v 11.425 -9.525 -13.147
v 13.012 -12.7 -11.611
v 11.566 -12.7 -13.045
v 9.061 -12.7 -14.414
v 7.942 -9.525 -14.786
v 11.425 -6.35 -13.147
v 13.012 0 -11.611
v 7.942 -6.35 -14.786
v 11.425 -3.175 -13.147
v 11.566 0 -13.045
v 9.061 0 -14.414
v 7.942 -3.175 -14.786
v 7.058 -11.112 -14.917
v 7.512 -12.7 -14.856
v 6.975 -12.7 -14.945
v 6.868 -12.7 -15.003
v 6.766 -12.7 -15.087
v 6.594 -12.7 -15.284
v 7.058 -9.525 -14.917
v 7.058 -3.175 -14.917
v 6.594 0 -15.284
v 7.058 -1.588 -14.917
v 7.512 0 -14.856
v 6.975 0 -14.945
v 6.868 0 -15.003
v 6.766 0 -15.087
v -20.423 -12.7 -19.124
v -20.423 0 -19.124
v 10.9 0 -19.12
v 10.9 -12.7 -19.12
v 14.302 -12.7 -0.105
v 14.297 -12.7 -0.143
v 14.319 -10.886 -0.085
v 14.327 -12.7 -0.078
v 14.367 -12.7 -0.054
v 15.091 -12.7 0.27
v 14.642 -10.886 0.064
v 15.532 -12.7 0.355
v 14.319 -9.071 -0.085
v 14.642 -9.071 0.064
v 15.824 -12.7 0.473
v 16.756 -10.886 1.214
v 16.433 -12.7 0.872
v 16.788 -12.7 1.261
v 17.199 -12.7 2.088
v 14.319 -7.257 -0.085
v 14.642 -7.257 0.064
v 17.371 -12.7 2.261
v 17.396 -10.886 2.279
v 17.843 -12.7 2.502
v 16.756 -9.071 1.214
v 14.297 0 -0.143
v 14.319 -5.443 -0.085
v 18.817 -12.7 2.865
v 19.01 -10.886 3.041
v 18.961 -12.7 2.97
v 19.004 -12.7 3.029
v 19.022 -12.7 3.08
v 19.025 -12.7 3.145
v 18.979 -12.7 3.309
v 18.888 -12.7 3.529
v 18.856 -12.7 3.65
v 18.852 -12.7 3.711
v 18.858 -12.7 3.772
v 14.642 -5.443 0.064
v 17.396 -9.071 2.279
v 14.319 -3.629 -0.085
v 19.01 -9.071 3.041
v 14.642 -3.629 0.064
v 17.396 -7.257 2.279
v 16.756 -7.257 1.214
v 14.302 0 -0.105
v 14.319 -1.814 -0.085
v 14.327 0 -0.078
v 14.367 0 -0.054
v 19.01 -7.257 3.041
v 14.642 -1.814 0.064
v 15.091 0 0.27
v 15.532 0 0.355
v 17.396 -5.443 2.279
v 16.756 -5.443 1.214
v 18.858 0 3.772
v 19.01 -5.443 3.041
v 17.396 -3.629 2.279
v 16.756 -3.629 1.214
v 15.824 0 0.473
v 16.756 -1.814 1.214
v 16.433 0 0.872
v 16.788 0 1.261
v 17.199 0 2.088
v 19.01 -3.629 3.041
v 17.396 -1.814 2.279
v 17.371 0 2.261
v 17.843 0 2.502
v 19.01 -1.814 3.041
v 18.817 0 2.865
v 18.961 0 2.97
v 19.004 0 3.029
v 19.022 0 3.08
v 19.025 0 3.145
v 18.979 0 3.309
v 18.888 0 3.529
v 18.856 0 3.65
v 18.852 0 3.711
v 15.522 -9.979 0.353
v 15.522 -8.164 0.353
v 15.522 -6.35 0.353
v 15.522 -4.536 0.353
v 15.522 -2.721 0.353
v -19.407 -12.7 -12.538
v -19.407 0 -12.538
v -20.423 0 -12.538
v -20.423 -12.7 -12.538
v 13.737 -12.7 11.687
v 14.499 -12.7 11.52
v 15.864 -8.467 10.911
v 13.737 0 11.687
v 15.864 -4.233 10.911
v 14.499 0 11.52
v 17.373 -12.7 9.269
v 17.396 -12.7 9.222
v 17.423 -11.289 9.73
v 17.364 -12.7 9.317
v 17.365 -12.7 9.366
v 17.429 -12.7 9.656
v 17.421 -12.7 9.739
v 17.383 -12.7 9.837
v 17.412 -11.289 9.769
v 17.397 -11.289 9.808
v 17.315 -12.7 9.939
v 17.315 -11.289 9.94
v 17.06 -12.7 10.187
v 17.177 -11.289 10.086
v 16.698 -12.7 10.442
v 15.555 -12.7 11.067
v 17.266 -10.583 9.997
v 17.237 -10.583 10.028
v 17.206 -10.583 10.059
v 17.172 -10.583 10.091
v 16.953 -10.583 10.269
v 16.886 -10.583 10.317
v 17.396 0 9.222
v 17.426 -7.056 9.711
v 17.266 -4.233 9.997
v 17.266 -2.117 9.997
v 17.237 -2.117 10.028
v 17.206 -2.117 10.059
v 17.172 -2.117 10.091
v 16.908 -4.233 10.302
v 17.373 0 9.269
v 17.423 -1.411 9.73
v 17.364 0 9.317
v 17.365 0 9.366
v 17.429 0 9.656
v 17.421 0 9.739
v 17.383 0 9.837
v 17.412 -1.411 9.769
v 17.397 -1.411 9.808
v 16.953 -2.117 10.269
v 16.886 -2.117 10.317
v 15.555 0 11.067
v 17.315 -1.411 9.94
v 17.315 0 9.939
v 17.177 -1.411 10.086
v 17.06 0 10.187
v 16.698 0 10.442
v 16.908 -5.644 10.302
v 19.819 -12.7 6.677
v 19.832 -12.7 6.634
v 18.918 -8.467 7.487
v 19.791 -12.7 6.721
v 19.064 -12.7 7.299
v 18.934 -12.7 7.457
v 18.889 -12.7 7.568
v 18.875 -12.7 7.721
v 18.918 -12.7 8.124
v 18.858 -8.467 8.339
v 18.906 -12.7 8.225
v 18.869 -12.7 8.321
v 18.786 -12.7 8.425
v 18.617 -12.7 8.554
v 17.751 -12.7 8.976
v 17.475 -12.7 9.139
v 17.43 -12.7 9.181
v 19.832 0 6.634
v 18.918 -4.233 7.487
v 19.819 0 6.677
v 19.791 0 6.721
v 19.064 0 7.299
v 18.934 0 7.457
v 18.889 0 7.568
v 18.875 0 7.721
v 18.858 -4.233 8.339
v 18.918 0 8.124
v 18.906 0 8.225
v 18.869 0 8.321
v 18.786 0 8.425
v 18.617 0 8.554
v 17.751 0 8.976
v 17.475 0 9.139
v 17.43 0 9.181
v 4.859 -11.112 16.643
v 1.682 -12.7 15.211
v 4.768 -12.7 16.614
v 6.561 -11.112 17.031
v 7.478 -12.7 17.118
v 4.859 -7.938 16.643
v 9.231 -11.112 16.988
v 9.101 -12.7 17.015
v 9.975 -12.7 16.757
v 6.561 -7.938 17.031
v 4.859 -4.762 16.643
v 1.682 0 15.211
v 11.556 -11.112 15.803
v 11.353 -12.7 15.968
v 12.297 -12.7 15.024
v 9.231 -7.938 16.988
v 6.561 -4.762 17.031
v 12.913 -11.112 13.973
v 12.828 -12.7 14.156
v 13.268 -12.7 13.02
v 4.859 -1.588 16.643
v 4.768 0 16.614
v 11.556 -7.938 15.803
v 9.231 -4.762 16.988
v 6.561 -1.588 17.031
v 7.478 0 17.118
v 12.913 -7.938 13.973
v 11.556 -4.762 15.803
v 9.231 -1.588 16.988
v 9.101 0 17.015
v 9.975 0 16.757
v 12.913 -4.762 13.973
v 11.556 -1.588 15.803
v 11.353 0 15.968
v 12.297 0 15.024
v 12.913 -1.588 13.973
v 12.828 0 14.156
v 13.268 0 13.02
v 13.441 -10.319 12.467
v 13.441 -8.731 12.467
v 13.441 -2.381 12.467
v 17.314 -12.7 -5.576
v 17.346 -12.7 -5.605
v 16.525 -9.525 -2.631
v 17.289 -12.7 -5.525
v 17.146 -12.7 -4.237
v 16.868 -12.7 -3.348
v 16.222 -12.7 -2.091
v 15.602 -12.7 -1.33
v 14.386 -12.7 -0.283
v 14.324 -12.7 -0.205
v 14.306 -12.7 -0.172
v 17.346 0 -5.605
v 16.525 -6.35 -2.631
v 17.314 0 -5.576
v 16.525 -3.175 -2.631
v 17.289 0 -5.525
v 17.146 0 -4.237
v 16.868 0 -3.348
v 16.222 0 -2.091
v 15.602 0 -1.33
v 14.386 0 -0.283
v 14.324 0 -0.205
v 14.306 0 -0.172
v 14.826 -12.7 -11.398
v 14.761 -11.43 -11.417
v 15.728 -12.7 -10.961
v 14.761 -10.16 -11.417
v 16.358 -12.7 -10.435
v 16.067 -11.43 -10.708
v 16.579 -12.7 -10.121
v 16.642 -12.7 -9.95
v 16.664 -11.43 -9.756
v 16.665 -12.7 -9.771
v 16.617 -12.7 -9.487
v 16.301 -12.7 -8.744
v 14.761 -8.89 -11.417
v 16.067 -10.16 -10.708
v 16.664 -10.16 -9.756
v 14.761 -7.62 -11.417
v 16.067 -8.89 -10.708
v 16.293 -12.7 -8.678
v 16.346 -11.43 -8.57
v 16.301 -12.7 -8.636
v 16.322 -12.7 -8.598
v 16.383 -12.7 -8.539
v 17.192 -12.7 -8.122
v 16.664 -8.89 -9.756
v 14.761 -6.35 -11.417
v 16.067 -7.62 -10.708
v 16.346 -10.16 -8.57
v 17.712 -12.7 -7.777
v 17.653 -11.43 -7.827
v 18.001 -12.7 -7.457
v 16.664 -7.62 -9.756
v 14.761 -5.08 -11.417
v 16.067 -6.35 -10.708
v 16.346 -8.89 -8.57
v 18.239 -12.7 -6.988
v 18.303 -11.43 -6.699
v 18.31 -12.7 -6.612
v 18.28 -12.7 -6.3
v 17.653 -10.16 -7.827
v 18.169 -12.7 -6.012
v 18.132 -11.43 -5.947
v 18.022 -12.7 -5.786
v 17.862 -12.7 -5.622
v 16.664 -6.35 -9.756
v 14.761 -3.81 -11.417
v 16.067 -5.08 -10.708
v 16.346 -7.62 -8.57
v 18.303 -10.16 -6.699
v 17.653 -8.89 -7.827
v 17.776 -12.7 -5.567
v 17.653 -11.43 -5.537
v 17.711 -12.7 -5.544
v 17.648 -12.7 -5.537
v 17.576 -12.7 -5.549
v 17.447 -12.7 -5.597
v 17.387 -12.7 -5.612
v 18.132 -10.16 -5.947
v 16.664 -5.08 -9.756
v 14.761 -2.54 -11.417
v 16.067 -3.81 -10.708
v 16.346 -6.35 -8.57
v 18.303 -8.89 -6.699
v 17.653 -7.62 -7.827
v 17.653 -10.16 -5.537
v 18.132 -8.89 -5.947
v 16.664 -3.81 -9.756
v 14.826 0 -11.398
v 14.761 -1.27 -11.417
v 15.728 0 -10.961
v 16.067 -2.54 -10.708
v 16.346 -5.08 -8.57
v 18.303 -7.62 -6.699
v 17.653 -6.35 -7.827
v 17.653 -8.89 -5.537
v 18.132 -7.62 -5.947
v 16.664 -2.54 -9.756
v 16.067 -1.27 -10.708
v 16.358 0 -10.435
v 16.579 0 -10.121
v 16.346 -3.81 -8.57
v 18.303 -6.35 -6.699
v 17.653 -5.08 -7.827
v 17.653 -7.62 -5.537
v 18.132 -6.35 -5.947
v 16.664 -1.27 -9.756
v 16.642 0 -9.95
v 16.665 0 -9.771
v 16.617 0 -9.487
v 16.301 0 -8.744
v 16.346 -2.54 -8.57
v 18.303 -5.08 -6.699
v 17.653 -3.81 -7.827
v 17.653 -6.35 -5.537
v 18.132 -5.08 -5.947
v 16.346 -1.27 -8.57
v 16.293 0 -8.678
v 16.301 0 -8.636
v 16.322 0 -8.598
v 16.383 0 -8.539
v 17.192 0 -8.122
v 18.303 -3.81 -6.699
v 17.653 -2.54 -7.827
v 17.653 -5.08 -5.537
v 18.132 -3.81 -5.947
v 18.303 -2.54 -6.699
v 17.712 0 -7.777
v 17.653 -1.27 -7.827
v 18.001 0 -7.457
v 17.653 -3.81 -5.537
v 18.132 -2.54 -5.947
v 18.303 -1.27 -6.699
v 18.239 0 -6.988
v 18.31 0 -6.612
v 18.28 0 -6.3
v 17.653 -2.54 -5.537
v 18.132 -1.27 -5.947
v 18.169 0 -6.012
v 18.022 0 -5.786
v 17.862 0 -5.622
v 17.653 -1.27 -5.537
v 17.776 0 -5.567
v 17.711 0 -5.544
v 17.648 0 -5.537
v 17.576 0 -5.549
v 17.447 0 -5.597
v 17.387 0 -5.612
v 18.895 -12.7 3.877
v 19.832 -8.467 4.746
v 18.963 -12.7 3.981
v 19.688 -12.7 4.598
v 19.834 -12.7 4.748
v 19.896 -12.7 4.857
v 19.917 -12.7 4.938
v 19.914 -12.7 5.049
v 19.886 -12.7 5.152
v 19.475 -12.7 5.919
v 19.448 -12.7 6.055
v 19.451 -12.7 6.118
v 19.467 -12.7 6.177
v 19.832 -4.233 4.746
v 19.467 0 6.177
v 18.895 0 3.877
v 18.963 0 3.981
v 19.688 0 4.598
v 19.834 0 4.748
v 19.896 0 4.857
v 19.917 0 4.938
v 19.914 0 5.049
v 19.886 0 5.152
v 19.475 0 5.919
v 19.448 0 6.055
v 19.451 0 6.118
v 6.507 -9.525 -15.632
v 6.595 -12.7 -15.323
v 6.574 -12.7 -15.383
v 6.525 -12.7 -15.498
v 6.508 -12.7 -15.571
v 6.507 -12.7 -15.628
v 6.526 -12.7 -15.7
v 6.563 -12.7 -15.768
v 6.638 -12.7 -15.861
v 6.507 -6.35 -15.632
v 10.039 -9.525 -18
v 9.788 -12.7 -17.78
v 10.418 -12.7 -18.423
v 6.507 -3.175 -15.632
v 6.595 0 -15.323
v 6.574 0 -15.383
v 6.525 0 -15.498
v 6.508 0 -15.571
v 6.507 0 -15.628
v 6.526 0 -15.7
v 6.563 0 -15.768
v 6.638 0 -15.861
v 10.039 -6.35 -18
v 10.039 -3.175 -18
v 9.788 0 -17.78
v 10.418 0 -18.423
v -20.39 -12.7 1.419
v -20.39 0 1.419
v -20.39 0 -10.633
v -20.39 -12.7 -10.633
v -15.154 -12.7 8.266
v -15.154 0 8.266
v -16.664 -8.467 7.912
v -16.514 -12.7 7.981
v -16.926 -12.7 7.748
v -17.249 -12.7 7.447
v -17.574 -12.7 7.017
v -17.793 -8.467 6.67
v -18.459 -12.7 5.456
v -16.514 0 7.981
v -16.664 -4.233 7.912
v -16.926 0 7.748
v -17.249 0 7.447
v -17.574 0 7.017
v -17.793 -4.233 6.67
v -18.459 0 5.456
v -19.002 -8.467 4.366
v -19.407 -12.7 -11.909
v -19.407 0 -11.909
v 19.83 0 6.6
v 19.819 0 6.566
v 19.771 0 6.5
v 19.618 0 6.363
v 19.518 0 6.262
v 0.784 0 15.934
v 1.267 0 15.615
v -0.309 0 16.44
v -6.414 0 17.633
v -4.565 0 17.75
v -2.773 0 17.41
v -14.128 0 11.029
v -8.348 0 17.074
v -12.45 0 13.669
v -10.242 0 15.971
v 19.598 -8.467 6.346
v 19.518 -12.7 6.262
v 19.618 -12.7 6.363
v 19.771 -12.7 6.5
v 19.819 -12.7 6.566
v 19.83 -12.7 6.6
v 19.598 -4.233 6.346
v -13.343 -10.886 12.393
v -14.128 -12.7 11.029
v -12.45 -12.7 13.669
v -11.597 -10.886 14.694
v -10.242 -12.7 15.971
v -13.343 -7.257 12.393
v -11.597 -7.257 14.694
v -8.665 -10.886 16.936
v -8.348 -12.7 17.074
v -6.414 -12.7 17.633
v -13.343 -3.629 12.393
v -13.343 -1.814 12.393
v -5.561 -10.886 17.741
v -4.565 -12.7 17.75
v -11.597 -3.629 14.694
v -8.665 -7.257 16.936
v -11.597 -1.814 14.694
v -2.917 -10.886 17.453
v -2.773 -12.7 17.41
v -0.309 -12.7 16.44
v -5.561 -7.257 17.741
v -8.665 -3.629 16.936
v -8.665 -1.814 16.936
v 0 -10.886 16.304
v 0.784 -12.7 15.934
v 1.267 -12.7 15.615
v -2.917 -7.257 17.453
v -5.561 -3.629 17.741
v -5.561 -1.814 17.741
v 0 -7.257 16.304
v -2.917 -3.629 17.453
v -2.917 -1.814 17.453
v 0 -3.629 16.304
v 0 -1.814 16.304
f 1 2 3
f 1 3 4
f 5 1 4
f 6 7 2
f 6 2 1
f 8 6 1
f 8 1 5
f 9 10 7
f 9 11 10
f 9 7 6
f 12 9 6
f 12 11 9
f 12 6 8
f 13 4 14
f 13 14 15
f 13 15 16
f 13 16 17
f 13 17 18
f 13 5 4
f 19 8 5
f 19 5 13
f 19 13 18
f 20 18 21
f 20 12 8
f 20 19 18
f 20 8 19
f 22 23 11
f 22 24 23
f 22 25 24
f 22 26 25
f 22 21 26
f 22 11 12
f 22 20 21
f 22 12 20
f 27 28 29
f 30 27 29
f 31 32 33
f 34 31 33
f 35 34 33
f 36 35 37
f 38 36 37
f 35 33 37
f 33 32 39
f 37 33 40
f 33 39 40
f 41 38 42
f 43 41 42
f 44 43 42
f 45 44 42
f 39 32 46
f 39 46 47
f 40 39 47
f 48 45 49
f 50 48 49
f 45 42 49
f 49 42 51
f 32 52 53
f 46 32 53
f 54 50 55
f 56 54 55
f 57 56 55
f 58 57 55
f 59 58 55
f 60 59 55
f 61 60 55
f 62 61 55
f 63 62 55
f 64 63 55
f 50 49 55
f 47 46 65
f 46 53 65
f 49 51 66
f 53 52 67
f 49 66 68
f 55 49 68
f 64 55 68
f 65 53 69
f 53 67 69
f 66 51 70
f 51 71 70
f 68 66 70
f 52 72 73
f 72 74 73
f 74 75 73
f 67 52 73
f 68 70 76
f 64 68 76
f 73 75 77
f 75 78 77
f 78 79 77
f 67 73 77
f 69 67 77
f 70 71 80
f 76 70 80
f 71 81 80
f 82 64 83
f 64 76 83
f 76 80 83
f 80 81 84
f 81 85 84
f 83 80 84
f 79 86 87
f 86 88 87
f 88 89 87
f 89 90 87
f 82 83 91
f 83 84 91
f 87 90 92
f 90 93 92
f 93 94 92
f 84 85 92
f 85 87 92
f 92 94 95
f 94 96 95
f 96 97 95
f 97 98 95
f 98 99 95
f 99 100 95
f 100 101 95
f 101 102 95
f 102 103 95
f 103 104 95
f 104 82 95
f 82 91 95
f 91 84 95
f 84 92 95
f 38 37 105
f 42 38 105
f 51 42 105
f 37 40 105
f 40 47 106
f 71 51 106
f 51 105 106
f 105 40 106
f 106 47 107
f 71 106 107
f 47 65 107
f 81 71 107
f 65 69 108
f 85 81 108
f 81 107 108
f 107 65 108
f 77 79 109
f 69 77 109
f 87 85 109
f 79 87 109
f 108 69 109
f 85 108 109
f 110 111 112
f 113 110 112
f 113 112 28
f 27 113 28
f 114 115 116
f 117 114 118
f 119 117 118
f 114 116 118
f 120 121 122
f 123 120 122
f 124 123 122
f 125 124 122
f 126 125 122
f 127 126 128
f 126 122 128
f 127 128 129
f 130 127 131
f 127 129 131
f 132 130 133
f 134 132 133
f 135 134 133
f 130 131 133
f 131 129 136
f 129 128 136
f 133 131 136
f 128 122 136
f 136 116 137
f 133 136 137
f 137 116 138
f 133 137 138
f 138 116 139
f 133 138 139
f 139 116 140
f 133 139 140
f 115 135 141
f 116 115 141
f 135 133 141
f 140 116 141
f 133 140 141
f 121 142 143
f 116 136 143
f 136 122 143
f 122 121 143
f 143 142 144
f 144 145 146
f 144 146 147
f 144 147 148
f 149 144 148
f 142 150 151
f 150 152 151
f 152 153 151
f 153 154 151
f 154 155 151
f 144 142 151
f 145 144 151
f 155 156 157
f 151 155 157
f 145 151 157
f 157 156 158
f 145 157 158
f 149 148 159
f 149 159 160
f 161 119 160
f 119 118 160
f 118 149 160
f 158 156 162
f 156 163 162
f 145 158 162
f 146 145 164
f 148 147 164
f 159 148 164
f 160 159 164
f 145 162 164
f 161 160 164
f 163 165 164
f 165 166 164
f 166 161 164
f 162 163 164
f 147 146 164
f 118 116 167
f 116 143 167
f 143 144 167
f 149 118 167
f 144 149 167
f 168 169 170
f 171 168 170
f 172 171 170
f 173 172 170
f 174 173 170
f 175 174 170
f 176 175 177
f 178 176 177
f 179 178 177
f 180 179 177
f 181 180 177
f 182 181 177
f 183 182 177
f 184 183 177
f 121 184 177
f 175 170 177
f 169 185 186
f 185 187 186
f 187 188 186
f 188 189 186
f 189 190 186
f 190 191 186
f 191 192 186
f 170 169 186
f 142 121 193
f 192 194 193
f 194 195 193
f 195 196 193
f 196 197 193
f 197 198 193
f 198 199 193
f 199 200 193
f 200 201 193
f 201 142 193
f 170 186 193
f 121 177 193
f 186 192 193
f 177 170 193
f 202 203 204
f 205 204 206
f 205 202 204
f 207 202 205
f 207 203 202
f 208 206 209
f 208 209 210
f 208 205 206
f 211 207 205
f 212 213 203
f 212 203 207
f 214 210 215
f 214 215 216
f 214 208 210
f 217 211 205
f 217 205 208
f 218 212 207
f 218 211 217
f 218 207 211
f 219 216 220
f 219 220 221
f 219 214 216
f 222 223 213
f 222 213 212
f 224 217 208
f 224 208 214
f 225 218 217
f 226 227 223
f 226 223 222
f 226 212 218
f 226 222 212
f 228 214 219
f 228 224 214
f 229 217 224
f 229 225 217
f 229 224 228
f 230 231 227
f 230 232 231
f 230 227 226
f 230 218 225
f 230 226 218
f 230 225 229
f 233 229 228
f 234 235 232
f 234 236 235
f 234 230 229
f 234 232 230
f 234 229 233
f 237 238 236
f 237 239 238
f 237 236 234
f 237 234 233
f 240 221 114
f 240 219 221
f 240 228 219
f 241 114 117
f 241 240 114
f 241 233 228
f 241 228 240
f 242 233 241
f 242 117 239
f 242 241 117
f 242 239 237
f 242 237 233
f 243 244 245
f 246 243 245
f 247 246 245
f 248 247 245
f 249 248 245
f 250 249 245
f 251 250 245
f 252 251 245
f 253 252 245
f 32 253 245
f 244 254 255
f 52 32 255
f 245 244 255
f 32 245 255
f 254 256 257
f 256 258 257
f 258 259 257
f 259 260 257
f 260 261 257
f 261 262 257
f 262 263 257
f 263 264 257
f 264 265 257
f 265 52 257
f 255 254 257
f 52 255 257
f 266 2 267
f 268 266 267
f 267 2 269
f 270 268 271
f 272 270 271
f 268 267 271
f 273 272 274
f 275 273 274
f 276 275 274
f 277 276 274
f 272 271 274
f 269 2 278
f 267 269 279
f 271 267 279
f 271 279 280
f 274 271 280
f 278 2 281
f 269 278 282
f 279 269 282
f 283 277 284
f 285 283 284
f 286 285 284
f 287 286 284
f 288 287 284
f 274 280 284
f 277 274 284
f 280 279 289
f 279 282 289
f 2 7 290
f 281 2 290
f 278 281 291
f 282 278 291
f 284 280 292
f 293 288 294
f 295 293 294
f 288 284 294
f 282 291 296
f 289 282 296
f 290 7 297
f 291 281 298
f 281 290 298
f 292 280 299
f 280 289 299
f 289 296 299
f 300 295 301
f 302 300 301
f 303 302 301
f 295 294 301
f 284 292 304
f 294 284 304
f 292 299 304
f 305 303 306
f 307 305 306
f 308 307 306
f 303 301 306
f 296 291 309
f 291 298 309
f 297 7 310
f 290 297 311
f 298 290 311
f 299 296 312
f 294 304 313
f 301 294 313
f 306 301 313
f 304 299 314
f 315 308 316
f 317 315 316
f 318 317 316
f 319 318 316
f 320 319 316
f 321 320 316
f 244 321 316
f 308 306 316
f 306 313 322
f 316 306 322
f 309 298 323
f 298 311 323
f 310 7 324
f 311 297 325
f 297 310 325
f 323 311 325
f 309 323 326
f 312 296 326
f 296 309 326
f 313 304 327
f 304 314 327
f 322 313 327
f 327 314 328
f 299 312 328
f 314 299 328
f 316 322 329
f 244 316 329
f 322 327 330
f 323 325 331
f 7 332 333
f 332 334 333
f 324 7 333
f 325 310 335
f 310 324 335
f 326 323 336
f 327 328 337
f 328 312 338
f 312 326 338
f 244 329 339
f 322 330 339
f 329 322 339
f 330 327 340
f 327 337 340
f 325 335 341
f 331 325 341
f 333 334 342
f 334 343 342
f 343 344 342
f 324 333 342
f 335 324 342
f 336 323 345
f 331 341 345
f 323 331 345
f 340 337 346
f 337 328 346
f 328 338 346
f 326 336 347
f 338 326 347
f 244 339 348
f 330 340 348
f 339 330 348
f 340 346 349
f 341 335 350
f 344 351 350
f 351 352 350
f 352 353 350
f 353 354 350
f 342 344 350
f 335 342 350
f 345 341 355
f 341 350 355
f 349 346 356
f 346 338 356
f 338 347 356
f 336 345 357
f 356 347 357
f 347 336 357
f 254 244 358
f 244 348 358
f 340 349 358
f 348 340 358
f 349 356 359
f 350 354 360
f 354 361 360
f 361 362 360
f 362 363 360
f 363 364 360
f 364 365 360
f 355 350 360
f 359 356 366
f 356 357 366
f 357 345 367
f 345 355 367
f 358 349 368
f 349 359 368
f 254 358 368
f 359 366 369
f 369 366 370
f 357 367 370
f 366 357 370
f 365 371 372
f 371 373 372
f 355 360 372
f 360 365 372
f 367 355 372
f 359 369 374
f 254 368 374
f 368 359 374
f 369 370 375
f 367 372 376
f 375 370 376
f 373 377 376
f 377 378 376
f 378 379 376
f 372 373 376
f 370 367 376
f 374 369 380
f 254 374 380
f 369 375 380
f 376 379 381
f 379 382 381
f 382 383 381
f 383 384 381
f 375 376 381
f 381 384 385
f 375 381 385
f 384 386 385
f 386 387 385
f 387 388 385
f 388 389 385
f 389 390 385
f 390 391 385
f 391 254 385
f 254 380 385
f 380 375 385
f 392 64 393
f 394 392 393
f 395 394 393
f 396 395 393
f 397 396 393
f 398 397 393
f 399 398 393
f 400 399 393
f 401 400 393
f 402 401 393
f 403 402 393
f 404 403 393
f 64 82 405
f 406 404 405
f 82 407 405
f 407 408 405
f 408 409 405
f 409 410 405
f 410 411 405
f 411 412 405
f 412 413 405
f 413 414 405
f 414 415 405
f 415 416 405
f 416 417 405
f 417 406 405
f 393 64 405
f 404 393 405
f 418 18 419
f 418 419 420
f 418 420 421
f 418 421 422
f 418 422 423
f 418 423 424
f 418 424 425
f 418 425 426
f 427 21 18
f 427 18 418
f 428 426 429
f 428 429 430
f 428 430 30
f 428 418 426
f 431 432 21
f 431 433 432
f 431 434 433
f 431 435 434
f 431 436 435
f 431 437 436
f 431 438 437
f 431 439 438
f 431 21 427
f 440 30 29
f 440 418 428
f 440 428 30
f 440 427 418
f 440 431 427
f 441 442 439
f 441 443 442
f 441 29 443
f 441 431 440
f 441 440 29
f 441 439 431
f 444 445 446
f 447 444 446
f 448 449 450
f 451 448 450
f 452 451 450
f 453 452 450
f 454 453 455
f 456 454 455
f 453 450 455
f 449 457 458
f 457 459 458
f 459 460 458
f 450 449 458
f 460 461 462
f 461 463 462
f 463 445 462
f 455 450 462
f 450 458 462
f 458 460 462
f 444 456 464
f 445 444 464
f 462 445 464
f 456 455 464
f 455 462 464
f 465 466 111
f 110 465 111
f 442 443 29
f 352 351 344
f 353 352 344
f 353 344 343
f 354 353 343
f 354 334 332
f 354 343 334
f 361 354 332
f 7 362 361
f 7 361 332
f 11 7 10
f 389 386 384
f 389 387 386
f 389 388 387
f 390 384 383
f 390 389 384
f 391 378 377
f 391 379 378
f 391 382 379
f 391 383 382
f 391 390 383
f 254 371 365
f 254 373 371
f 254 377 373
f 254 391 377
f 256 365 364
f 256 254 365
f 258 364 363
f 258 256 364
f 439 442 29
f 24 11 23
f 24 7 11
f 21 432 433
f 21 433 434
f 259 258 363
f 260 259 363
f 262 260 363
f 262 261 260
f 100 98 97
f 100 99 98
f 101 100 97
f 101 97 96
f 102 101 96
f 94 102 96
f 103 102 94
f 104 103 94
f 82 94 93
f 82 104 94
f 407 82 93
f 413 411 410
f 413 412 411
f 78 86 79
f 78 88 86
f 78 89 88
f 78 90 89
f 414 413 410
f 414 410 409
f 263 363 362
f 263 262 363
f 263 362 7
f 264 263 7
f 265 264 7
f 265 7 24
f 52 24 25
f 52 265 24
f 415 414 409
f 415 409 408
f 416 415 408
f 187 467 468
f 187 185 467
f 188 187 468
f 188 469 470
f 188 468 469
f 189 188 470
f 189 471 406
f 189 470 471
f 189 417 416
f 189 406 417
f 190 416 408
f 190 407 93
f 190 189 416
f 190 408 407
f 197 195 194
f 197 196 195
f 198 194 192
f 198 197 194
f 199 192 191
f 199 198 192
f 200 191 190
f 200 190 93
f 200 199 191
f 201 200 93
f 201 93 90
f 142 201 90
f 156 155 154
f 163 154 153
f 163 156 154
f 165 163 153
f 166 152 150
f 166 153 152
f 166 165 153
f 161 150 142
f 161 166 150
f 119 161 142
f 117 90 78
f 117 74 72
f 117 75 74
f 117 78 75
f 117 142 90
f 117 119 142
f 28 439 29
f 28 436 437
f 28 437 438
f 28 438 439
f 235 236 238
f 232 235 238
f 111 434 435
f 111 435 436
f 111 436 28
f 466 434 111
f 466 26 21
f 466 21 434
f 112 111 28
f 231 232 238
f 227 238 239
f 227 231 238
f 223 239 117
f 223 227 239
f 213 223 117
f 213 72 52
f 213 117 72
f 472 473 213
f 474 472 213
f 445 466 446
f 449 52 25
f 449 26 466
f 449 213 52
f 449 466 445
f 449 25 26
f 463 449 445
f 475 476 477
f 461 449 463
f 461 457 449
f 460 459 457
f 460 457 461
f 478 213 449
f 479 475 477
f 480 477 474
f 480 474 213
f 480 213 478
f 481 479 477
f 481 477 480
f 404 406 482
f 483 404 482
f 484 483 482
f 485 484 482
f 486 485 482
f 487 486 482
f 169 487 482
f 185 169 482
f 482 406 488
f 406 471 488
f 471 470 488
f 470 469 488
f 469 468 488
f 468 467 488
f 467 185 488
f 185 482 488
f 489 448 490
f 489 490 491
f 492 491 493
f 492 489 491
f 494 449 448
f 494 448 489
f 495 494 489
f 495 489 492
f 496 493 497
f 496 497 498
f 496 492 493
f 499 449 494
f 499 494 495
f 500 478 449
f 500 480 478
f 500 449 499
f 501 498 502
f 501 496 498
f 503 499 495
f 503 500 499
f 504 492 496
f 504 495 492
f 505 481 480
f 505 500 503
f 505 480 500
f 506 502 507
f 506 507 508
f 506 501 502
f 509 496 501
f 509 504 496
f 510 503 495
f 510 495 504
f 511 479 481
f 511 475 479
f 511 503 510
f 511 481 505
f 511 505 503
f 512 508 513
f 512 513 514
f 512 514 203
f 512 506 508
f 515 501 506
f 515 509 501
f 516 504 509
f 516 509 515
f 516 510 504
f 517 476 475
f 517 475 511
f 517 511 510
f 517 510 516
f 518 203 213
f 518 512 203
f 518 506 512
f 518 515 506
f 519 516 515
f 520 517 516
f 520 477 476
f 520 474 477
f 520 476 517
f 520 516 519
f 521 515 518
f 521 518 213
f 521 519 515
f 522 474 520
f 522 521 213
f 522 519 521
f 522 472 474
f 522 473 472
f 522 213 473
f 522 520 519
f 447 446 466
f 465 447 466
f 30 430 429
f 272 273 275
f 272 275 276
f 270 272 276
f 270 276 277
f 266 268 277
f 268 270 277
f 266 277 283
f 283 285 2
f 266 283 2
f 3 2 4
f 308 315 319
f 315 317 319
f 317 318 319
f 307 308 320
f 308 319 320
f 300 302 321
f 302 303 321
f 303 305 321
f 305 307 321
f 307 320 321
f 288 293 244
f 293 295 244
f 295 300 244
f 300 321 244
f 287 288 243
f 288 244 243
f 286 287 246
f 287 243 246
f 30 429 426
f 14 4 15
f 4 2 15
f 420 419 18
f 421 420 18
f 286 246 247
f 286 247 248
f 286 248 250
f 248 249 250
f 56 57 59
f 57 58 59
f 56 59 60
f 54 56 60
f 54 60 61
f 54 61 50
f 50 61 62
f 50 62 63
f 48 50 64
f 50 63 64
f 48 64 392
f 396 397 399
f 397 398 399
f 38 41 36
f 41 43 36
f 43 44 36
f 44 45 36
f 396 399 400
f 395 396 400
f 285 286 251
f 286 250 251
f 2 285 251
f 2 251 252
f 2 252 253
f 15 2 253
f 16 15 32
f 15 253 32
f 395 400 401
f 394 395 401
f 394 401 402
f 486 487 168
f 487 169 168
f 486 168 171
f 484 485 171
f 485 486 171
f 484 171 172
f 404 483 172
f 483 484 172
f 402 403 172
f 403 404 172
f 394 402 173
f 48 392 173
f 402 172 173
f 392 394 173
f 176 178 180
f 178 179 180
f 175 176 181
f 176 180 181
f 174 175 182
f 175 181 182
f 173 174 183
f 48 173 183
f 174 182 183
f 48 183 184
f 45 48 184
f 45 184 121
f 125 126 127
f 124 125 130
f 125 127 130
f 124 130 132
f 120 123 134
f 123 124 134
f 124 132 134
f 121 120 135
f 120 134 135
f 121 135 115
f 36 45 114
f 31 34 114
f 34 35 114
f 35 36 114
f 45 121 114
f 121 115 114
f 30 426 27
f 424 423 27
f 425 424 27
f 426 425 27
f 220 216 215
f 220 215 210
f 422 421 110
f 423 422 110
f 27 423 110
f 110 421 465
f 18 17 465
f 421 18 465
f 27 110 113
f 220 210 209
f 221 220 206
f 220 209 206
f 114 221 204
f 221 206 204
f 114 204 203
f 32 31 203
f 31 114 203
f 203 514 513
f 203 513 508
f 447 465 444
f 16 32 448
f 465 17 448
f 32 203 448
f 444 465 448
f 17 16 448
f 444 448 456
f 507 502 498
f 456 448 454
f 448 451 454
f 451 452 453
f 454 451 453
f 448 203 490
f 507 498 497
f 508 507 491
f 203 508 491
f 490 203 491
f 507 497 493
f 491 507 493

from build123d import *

# Parameters (mm, degrees)
F1_DEPTH = 12.7


with BuildPart() as f1:
    # F0 (on Front) → F1 (new body)
    with BuildSketch(Plane.XZ):
        with BuildLine():
            add(Edge.make_bspline(
                [(-15.154437306, 8.266335297), (-15.0386769934, 8.7557337939), (-14.3741383819, 10.9978091678), (-11.8075027584, 14.8539144241), (-8.8682439542, 17.1025149238), (-5.5510699204, 17.9113797341), (-2.9329017816, 17.6184345826), (0.029448146, 16.2812136827), (1.1874474387, 15.7882755265), (1.681912574, 15.2114974335)],
                knots=[0.0948368965, 0.0948368965, 0.0948368965, 0.0948368965, 0.1381276669, 0.2913133216, 0.4131166921, 0.5266549515, 0.6300587596, 0.7423234113, 0.8321097944, 0.8321097944, 0.8321097944, 0.8321097944], degree=3))
            add(Edge.make_bspline(
                [(-15.154437306, 8.266335297), (-15.6970933244, 8.1973941045), (-16.8058294964, 8.0574230249), (-17.9939130366, 6.5810091616), (-19.4450451522, 3.4551507862), (-20.3898958862, 1.4194942778)],
                knots=[0, 0, 0, 0, 0.250970157, 0.5121328909, 1, 1, 1, 1], degree=3))
            Line((-20.3898958862, 1.4194942778), (-20.3898958862, -10.6331566349))
            Line((-20.3898958862, -10.6331566349), (-19.4074194878, -11.9092175737))
            add(Edge.make_bspline(
                [(-19.4074194878, -11.9092175737), (-18.5180737994, -12.4183908814), (-16.581459682, -13.5271523324), (-12.3451670543, -14.8422736814), (-5.009688178, -15.6796818442), (1.7860413854, -15.8777963562), (4.5406408215, -15.4618435648), (5.7173287496, -15.2841601521)],
                knots=[0, 0, 0, 0, 0.1583864727, 0.3448979212, 0.590608127, 0.8251192284, 1, 1, 1, 1], degree=3))
            add(Edge.make_bspline(
                [(5.7173287496, -15.2841601521), (5.8609689506, -15.2658925201), (6.0046091517, -15.2476248882), (6.1329162172, -15.2358156923)],
                knots=[0, 0, 0, 0, 0.0569882776, 0.0569882776, 0.0569882776, 0.0569882776], degree=3))
            add(Edge.make_bspline(
                [(6.1329162172, -15.2358156923), (6.3783655594, -15.2132248913), (6.5677031823, -15.2142687829), (6.593588274, -15.2841601521)],
                knots=[0.0569882776, 0.0569882776, 0.0569882776, 0.0569882776, 0.1660059315, 0.1660059315, 0.1660059315, 0.1660059315], degree=3))
            add(Edge.make_bspline(
                [(13.0124511197, -11.6107994691), (12.5939476472, -12.1151119974), (11.6230665427, -13.2850604846), (8.0648895517, -14.9571747505), (6.9580454759, -14.8325148516), (6.6999238056, -15.1523862623), (6.593588274, -15.2841601521)],
                knots=[0, 0, 0, 0, 0.288665761, 0.6696721803, 0.863918499, 1, 1, 1, 1], degree=3))
            add(Edge.make_bspline(
                [(17.3456892371, -5.6049809791), (16.7894235563, -5.8159730563), (15.5297664705, -6.2937621314), (12.6939593803, -7.3387226453), (9.5153698979, -7.5177566902), (6.8313239775, -7.3878665753), (-0.0764413013, -6.4191861087), (-4.2569807618, -5.4711619397), (-7.1031631337, -5.5883503751), (-8.6113560055, -5.7114062767), (-9.6992037188, -7.0974632625), (-10.1008982052, -8.2753221902), (-9.7951087777, -9.1999689012), (-8.8178808563, -10.0607275543), (-5.1552975142, -9.5027954786), (0.0958312582, -10.9234706923), (4.9916901863, -11.4326531973), (10.1309060151, -11.5467984944), (13.0124511197, -11.6107994691)],
                knots=[0, 0, 0, 0, 0.049671967, 0.1124815846, 0.1755999807, 0.2355156609, 0.3303542289, 0.407198297, 0.4661951976, 0.5089927858, 0.5551744044, 0.5948848593, 0.6285124105, 0.6657059392, 0.7329100796, 0.8172164163, 0.8975137145, 1, 1, 1, 1], degree=3))
            add(Edge.make_bspline(
                [(17.3456892371, -5.6049809791), (17.2093743725, -5.5377179746), (17.3063700602, -4.2081202189), (16.5247246741, -2.5910716918), (15.8122696589, -1.333796201), (14.3265511753, -0.3285375648), (14.2966350541, -0.1434823062)],
                knots=[0.2794739754, 0.2794739754, 0.2794739754, 0.2794739754, 0.3111508711, 0.3507898736, 0.3877031749, 0.4254693863, 0.4254693863, 0.4254693863, 0.4254693863], degree=3))
            add(Edge.make_bspline(
                [(14.2966350541, -0.1434823062), (14.28528809, -0.0732922116), (14.5390943831, -0.0082832717), (15.2057805922, 0.3674052609), (15.5504917984, 0.2720297382), (17.0298739485, 1.1324602338), (17.0023826914, 2.5038946686), (19.5386052141, 2.8164835894), (18.8087282257, 3.5114027514), (18.8575629145, 3.771558404)],
                knots=[0.4254693863, 0.4254693863, 0.4254693863, 0.4254693863, 0.4397938316, 0.4647992014, 0.4821806427, 0.5172443036, 0.5493696586, 0.5878624432, 0.6127594912, 0.6127594912, 0.6127594912, 0.6127594912], degree=3))
            add(Edge.make_bspline(
                [(6.526443176, 3.4349041525), (6.7192580038, 3.2869289286), (7.4139094803, 2.8639984225), (10.6532981542, 2.6478504245), (12.6043444481, 2.5154552823), (16.2310966256, 3.0020580182), (18.0173440963, 3.5253916409), (18.8575629145, 3.771558404)],
                knots=[0.0806534582, 0.0806534582, 0.0806534582, 0.0806534582, 0.196695384, 0.4063898377, 0.5802846438, 0.8025734137, 1, 1, 1, 1], degree=3))
            add(Edge.make_bspline(
                [(6.1772041954, 3.7408485077), (6.2848169441, 3.6393004747), (6.3924296928, 3.5377524418), (6.526443176, 3.4349041525)],
                knots=[0, 0, 0, 0, 0.0806534582, 0.0806534582, 0.0806534582, 0.0806534582], degree=3))
            add(Edge.make_bspline(
                [(5.7160095312, 7.9729855061), (5.0976693943, 8.2343174608), (3.7832262547, 8.7898466502), (1.1324645762, 9.0915716453), (-1.2590290764, 9.1863055842), (-3.8046943656, 8.0101043248), (-5.4662193187, 6.9958814732), (-7.3273259826, 6.1196327492), (-9.8163628138, 6.4981602022), (-10.1164278599, 5.5847431918), (-9.7430054798, 4.8978145547), (-8.7088858545, 5.1226858385), (-7.5608226582, 5.0596859794), (-6.4051488336, 3.9290459905), (-3.9867909343, 2.9861774035), (-2.2442746112, 2.135312525), (1.5307170459, 2.1064600064), (5.2711146458, 2.843862781), (6.1772041954, 3.7408485077)],
                knots=[0, 0, 0, 0, 0.0417728545, 0.0887990909, 0.133853577, 0.1816191509, 0.2221508879, 0.264090264, 0.3076439294, 0.3313226722, 0.3539557012, 0.3822014935, 0.4125147818, 0.448777936, 0.4950531519, 0.5350637901, 0.5917596244, 0.6555244473, 0.6555244473, 0.6555244473, 0.6555244473], degree=3))
            add(Edge.make_bspline(
                [(5.7160095312, 7.9729855061), (5.8226634167, 8.133455294), (5.9293173023, 8.293925082), (5.9873005375, 8.4341801703)],
                knots=[0, 0, 0, 0, 0.2132206179, 0.2132206179, 0.2132206179, 0.2132206179], degree=3))
            add(Edge.make_bspline(
                [(5.9873005375, 8.4341801703), (6.0362142973, 8.552497192), (6.0703656619, 8.8010891941), (5.5060942003, 9.3564826015), (5.0586828442, 9.7407121368)],
                knots=[0.2132206179, 0.2132206179, 0.2132206179, 0.2132206179, 0.393090231, 0.6434475586, 0.6434475586, 0.6434475586, 0.6434475586], degree=3))
            add(Edge.make_bspline(
                [(5.0586828442, 9.7407121368), (4.4214911434, 10.2879219198), (3.5428317334, 10.9589281712), (2.6641723234, 11.6299344227)],
                knots=[0.6434475586, 0.6434475586, 0.6434475586, 0.6434475586, 1, 1, 1, 1], degree=3))
            add(Edge.make_bspline(
                [(3.0040566344, 11.7049422115), (2.8865220696, 11.6584858594), (2.7689875048, 11.6120295074), (2.6641723234, 11.6299344227)],
                knots=[0, 0, 0, 0, 0.0600694759, 0.0600694759, 0.0600694759, 0.0600694759], degree=3))
            add(Edge.make_bspline(
                [(1.681912574, 15.2114974335), (2.2822756765, 14.5111926787), (3.1611878768, 12.6205136788), (3.0448523628, 11.9426505396), (3.0040566344, 11.7049422115)],
                knots=[0.8321097944, 0.8321097944, 0.8321097944, 0.8321097944, 0.9411254312, 1, 1, 1, 1], degree=3))
        make_face()
        with BuildLine():
            add(Edge.make_bspline(
                [(1.681912574, 15.2114974335), (2.2534059294, 15.5107841583), (3.3494857467, 16.0847928245), (4.8689656121, 16.6840744149), (6.5738284086, 17.1032992013), (9.2981220799, 17.2376703937), (11.6788150449, 15.9272363839), (12.9986733768, 14.15684852), (13.5304758298, 12.0692875636), (13.6890999092, 11.7758661013), (13.7369148433, 11.6874184459)],
                knots=[0, 0, 0, 0, 0.1277859741, 0.2450835618, 0.3677440513, 0.5194962645, 0.6695145135, 0.8096804032, 0.9426309106, 1, 1, 1, 1], degree=3))
            add(Edge.make_bspline(
                [(1.681912574, 15.2114974335), (2.2822756765, 14.5111926787), (3.1611878768, 12.6205136788), (3.0448523628, 11.9426505396), (3.0040566344, 11.7049422115)],
                knots=[0.8321097944, 0.8321097944, 0.8321097944, 0.8321097944, 0.9411254312, 1, 1, 1, 1], degree=3))
            add(Edge.make_bspline(
                [(3.0040566344, 11.7049422115), (3.825450629, 11.7796086695), (5.4822789239, 11.9302178792), (8.0414223037, 12.2516280122), (10.0610547761, 11.9381978313), (11.121368967, 11.7736458778)],
                knots=[0, 0, 0, 0, 0.3183430957, 0.6421277144, 1, 1, 1, 1], degree=3))
            add(Edge.make_bspline(
                [(13.7369148433, 11.6874184459), (13.4439442962, 11.6957851322), (13.0176107364, 11.48941269), (12.1511241129, 12.0723044073), (11.4728343183, 11.875580911), (11.121368967, 11.7736458778)],
                knots=[0.918596296, 0.918596296, 0.918596296, 0.918596296, 0.9431612313, 0.9705481964, 1, 1, 1, 1], degree=3))
        make_face()
        with BuildLine():
            add(Edge.make_bspline(
                [(3.0040566344, 11.7049422115), (3.825450629, 11.7796086695), (5.4822789239, 11.9302178792), (8.0414223037, 12.2516280122), (10.0610547761, 11.9381978313), (11.121368967, 11.7736458778)],
                knots=[0, 0, 0, 0, 0.3183430957, 0.6421277144, 1, 1, 1, 1], degree=3))
            add(Edge.make_bspline(
                [(3.0040566344, 11.7049422115), (2.8865220696, 11.6584858594), (2.7689875048, 11.6120295074), (2.6641723234, 11.6299344227)],
                knots=[0, 0, 0, 0, 0.0600694759, 0.0600694759, 0.0600694759, 0.0600694759], degree=3))
            add(Edge.make_bspline(
                [(5.0586828442, 9.7407121368), (4.4214911434, 10.2879219198), (3.5428317334, 10.9589281712), (2.6641723234, 11.6299344227)],
                knots=[0.6434475586, 0.6434475586, 0.6434475586, 0.6434475586, 1, 1, 1, 1], degree=3))
            add(Edge.make_bspline(
                [(5.9873005375, 8.4341801703), (6.0362142973, 8.552497192), (6.0703656619, 8.8010891941), (5.5060942003, 9.3564826015), (5.0586828442, 9.7407121368)],
                knots=[0.2132206179, 0.2132206179, 0.2132206179, 0.2132206179, 0.393090231, 0.6434475586, 0.6434475586, 0.6434475586, 0.6434475586], degree=3))
            add(Edge.make_bspline(
                [(5.9873005375, 8.4341801703), (7.2870663159, 8.8664574837), (9.8142199234, 9.7069405846), (13.4522244996, 9.9528294243), (16.0577204257, 9.4702199414), (17.3958968371, 9.2223528773)],
                knots=[0, 0, 0, 0, 0.3399710799, 0.6610107416, 1, 1, 1, 1], degree=3))
            add(Edge.make_bspline(
                [(17.3958968371, 9.2223528773), (17.2994233335, 9.3709031736), (17.755061546, 9.8475006389), (15.8039725214, 11.0060517119), (14.2540213824, 11.6726508584), (13.7369148433, 11.6874184459)],
                knots=[0.8146477527, 0.8146477527, 0.8146477527, 0.8146477527, 0.8347809324, 0.8752380512, 0.918596296, 0.918596296, 0.918596296, 0.918596296], degree=3))
            add(Edge.make_bspline(
                [(13.7369148433, 11.6874184459), (13.4439442962, 11.6957851322), (13.0176107364, 11.48941269), (12.1511241129, 12.0723044073), (11.4728343183, 11.875580911), (11.121368967, 11.7736458778)],
                knots=[0.918596296, 0.918596296, 0.918596296, 0.918596296, 0.9431612313, 0.9705481964, 1, 1, 1, 1], degree=3))
        make_face()
        with BuildLine():
            add(Edge.make_bspline(
                [(19.832007587, 6.633986719), (19.8064132047, 6.8547435664), (18.4881390523, 7.3872021621), (19.3650330523, 8.5287284815), (17.5763357516, 8.944512297), (17.3958968371, 9.2223528773)],
                knots=[0.7181383109, 0.7181383109, 0.7181383109, 0.7181383109, 0.7503501039, 0.7769917232, 0.8146477527, 0.8146477527, 0.8146477527, 0.8146477527], degree=3))
            add(Edge.make_bspline(
                [(5.9873005375, 8.4341801703), (7.2870663159, 8.8664574837), (9.8142199234, 9.7069405846), (13.4522244996, 9.9528294243), (16.0577204257, 9.4702199414), (17.3958968371, 9.2223528773)],
                knots=[0, 0, 0, 0, 0.3399710799, 0.6610107416, 1, 1, 1, 1], degree=3))
            add(Edge.make_bspline(
                [(5.7160095312, 7.9729855061), (5.8226634167, 8.133455294), (5.9293173023, 8.293925082), (5.9873005375, 8.4341801703)],
                knots=[0, 0, 0, 0, 0.2132206179, 0.2132206179, 0.2132206179, 0.2132206179], degree=3))
            add(Edge.make_bspline(
                [(5.7160095312, 7.9729855061), (5.0976693943, 8.2343174608), (3.7832262547, 8.7898466502), (1.1324645762, 9.0915716453), (-1.2590290764, 9.1863055842), (-3.8046943656, 8.0101043248), (-5.4662193187, 6.9958814732), (-7.3273259826, 6.1196327492), (-9.8163628138, 6.4981602022), (-10.1164278599, 5.5847431918), (-9.7430054798, 4.8978145547), (-8.7088858545, 5.1226858385), (-7.5608226582, 5.0596859794), (-6.4051488336, 3.9290459905), (-3.9867909343, 2.9861774035), (-2.2442746112, 2.135312525), (1.5307170459, 2.1064600064), (5.2711146458, 2.843862781), (6.1772041954, 3.7408485077)],
                knots=[0, 0, 0, 0, 0.0417728545, 0.0887990909, 0.133853577, 0.1816191509, 0.2221508879, 0.264090264, 0.3076439294, 0.3313226722, 0.3539557012, 0.3822014935, 0.4125147818, 0.448777936, 0.4950531519, 0.5350637901, 0.5917596244, 0.6555244473, 0.6555244473, 0.6555244473, 0.6555244473], degree=3))
            add(Edge.make_bspline(
                [(6.1772041954, 3.7408485077), (6.7804296893, 4.3380131679), (6.9077022432, 5.1597331413), (6.8554310128, 5.7755294256)],
                knots=[0.6555244473, 0.6555244473, 0.6555244473, 0.6555244473, 0.6979756231, 0.6979756231, 0.6979756231, 0.6979756231], degree=3))
            add(Edge.make_bspline(
                [(6.8554310128, 5.7755294256), (7.4127268279, 6.1772309108), (8.5365975009, 6.9873222596), (10.8359007914, 7.4085355769), (12.0886982355, 8.2798741832), (17.0602348476, 7.6598327031), (17.2749481279, 6.4618591472), (18.1640129309, 6.7709903663), (18.9818248171, 6.3981944314), (19.4665901363, 6.1772163026)],
                knots=[0, 0, 0, 0, 0.1554835998, 0.3135560204, 0.4527660347, 0.6833732817, 0.7808534577, 0.8700989246, 1, 1, 1, 1], degree=3))
            add(Edge.make_bspline(
                [(19.4665901363, 6.1772163026), (19.5412639356, 6.3649920847), (19.8495187837, 6.4829490199), (19.832007587, 6.633986719)],
                knots=[0.6960996056, 0.6960996056, 0.6960996056, 0.6960996056, 0.7181383109, 0.7181383109, 0.7181383109, 0.7181383109], degree=3))
        make_face()
        with BuildLine():
            add(Edge.make_bspline(
                [(-19.4074194878, -11.9092175737), (-18.5180737994, -12.4183908814), (-16.581459682, -13.5271523324), (-12.3451670543, -14.8422736814), (-5.009688178, -15.6796818442), (1.7860413854, -15.8777963562), (4.5406408215, -15.4618435648), (5.7173287496, -15.2841601521)],
                knots=[0, 0, 0, 0, 0.1583864727, 0.3448979212, 0.590608127, 0.8251192284, 1, 1, 1, 1], degree=3))
            Line((-19.4074194878, -11.9092175737), (-19.4074194878, -12.5376181677))
            add(Edge.make_bspline(
                [(-19.4074194878, -12.5376181677), (-19.0472552288, -12.845749507), (-18.2284150574, -13.5462918632), (-16.1095042703, -14.7285973698), (-13.1361108144, -15.5154421589), (-10.9251402345, -16.5738087853), (-5.9100838248, -16.7490847664), (-0.1724251453, -17.2908414684), (3.8058081405, -16.8613123017), (5.5898965016, -16.165531621), (5.97033494, -15.5151162124), (6.1329162172, -15.2358156923)],
                knots=[0, 0, 0, 0, 0.0812834053, 0.1847993406, 0.3004630597, 0.4035112423, 0.5505877757, 0.714091053, 0.8463018481, 0.9338504569, 0.9996178421, 0.9996178421, 0.9996178421, 0.9996178421], degree=3))
            add(Edge.make_bspline(
                [(5.7173287496, -15.2841601521), (5.8609689506, -15.2658925201), (6.0046091517, -15.2476248882), (6.1329162172, -15.2358156923)],
                knots=[0, 0, 0, 0, 0.0569882776, 0.0569882776, 0.0569882776, 0.0569882776], degree=3))
        make_face()
        with BuildLine():
            add(Edge.make_bspline(
                [(-19.4074194878, -12.5376181677), (-19.0472552288, -12.845749507), (-18.2284150574, -13.5462918632), (-16.1095042703, -14.7285973698), (-13.1361108144, -15.5154421589), (-10.9251402345, -16.5738087853), (-5.9100838248, -16.7490847664), (-0.1724251453, -17.2908414684), (3.8058081405, -16.8613123017), (5.5898965016, -16.165531621), (5.97033494, -15.5151162124), (6.1329162172, -15.2358156923)],
                knots=[0, 0, 0, 0, 0.0812834053, 0.1847993406, 0.3004630597, 0.4035112423, 0.5505877757, 0.714091053, 0.8463018481, 0.9338504569, 0.9996178421, 0.9996178421, 0.9996178421, 0.9996178421], degree=3))
            Line((-19.4074194878, -12.5376181677), (-20.4225294292, -12.5376181677))
            Line((-20.4225294292, -12.5376181677), (-20.4225294292, -19.1239900887))
            Line((-20.4225294292, -19.1239900887), (10.9000606462, -19.1200692207))
            add(Edge.make_bspline(
                [(6.593588274, -15.2841601521), (6.6187886743, -15.3522028118), (6.1792813673, -15.8038282843), (8.3642125184, -16.8457691242), (10.0863730581, -17.8622340283), (10.6497505316, -18.7331284883), (10.9000606462, -19.1200692207)],
                knots=[0.1660059315, 0.1660059315, 0.1660059315, 0.1660059315, 0.2721399394, 0.5256024751, 0.7892239139, 1, 1, 1, 1], degree=3))
            add(Edge.make_bspline(
                [(6.1329162172, -15.2358156923), (6.3783655594, -15.2132248913), (6.5677031823, -15.2142687829), (6.593588274, -15.2841601521)],
                knots=[0.0569882776, 0.0569882776, 0.0569882776, 0.0569882776, 0.1660059315, 0.1660059315, 0.1660059315, 0.1660059315], degree=3))
        make_face()
        with BuildLine():
            add(Edge.make_bspline(
                [(18.8575629145, 3.771558404), (18.9239131438, 4.1250240984), (20.0541918113, 4.6687848183), (19.8620925041, 5.3240655409), (19.3731413614, 5.9422287039), (19.4665901363, 6.1772163026)],
                knots=[0.6127594912, 0.6127594912, 0.6127594912, 0.6127594912, 0.6465863648, 0.6685197847, 0.6960996056, 0.6960996056, 0.6960996056, 0.6960996056], degree=3))
            add(Edge.make_bspline(
                [(6.8554310128, 5.7755294256), (7.4127268279, 6.1772309108), (8.5365975009, 6.9873222596), (10.8359007914, 7.4085355769), (12.0886982355, 8.2798741832), (17.0602348476, 7.6598327031), (17.2749481279, 6.4618591472), (18.1640129309, 6.7709903663), (18.9818248171, 6.3981944314), (19.4665901363, 6.1772163026)],
                knots=[0, 0, 0, 0, 0.1554835998, 0.3135560204, 0.4527660347, 0.6833732817, 0.7808534577, 0.8700989246, 1, 1, 1, 1], degree=3))
            add(Edge.make_bspline(
                [(6.1772041954, 3.7408485077), (6.7804296893, 4.3380131679), (6.9077022432, 5.1597331413), (6.8554310128, 5.7755294256)],
                knots=[0.6555244473, 0.6555244473, 0.6555244473, 0.6555244473, 0.6979756231, 0.6979756231, 0.6979756231, 0.6979756231], degree=3))
            add(Edge.make_bspline(
                [(6.1772041954, 3.7408485077), (6.2848169441, 3.6393004747), (6.3924296928, 3.5377524418), (6.526443176, 3.4349041525)],
                knots=[0, 0, 0, 0, 0.0806534582, 0.0806534582, 0.0806534582, 0.0806534582], degree=3))
            add(Edge.make_bspline(
                [(6.526443176, 3.4349041525), (6.7192580038, 3.2869289286), (7.4139094803, 2.8639984225), (10.6532981542, 2.6478504245), (12.6043444481, 2.5154552823), (16.2310966256, 3.0020580182), (18.0173440963, 3.5253916409), (18.8575629145, 3.771558404)],
                knots=[0.0806534582, 0.0806534582, 0.0806534582, 0.0806534582, 0.196695384, 0.4063898377, 0.5802846438, 0.8025734137, 1, 1, 1, 1], degree=3))
        make_face()
        with BuildLine():
            add(Edge.make_bspline(
                [(17.3456892371, -5.6049809791), (16.7894235563, -5.8159730563), (15.5297664705, -6.2937621314), (12.6939593803, -7.3387226453), (9.5153698979, -7.5177566902), (6.8313239775, -7.3878665753), (-0.0764413013, -6.4191861087), (-4.2569807618, -5.4711619397), (-7.1031631337, -5.5883503751), (-8.6113560055, -5.7114062767), (-9.6992037188, -7.0974632625), (-10.1008982052, -8.2753221902), (-9.7951087777, -9.1999689012), (-8.8178808563, -10.0607275543), (-5.1552975142, -9.5027954786), (0.0958312582, -10.9234706923), (4.9916901863, -11.4326531973), (10.1309060151, -11.5467984944), (13.0124511197, -11.6107994691)],
                knots=[0, 0, 0, 0, 0.049671967, 0.1124815846, 0.1755999807, 0.2355156609, 0.3303542289, 0.407198297, 0.4661951976, 0.5089927858, 0.5551744044, 0.5948848593, 0.6285124105, 0.6657059392, 0.7329100796, 0.8172164163, 0.8975137145, 1, 1, 1, 1], degree=3))
            add(Edge.make_bspline(
                [(13.0124511197, -11.6107994691), (13.6178399568, -11.5913989536), (14.7798220594, -11.5541616437), (16.0720924138, -10.7955369177), (16.9429002377, -9.82529199), (16.2474740809, -8.792240127), (16.3249370047, -8.4666039024), (17.8346631586, -7.9697721586), (18.4202513448, -6.7273427114), (18.2096182016, -5.9616475953), (17.6962923459, -5.392800284), (17.4152991221, -5.6393291774), (17.3456892371, -5.6049809791)],
                knots=[0, 0, 0, 0, 0.0382181949, 0.0733559256, 0.1038975699, 0.1333688306, 0.1473338307, 0.1822431045, 0.2151174437, 0.2404217622, 0.2632980061, 0.2794739754, 0.2794739754, 0.2794739754, 0.2794739754], degree=3))
        make_face()
    extrude(amount=F1_DEPTH)


solid = f1.part
